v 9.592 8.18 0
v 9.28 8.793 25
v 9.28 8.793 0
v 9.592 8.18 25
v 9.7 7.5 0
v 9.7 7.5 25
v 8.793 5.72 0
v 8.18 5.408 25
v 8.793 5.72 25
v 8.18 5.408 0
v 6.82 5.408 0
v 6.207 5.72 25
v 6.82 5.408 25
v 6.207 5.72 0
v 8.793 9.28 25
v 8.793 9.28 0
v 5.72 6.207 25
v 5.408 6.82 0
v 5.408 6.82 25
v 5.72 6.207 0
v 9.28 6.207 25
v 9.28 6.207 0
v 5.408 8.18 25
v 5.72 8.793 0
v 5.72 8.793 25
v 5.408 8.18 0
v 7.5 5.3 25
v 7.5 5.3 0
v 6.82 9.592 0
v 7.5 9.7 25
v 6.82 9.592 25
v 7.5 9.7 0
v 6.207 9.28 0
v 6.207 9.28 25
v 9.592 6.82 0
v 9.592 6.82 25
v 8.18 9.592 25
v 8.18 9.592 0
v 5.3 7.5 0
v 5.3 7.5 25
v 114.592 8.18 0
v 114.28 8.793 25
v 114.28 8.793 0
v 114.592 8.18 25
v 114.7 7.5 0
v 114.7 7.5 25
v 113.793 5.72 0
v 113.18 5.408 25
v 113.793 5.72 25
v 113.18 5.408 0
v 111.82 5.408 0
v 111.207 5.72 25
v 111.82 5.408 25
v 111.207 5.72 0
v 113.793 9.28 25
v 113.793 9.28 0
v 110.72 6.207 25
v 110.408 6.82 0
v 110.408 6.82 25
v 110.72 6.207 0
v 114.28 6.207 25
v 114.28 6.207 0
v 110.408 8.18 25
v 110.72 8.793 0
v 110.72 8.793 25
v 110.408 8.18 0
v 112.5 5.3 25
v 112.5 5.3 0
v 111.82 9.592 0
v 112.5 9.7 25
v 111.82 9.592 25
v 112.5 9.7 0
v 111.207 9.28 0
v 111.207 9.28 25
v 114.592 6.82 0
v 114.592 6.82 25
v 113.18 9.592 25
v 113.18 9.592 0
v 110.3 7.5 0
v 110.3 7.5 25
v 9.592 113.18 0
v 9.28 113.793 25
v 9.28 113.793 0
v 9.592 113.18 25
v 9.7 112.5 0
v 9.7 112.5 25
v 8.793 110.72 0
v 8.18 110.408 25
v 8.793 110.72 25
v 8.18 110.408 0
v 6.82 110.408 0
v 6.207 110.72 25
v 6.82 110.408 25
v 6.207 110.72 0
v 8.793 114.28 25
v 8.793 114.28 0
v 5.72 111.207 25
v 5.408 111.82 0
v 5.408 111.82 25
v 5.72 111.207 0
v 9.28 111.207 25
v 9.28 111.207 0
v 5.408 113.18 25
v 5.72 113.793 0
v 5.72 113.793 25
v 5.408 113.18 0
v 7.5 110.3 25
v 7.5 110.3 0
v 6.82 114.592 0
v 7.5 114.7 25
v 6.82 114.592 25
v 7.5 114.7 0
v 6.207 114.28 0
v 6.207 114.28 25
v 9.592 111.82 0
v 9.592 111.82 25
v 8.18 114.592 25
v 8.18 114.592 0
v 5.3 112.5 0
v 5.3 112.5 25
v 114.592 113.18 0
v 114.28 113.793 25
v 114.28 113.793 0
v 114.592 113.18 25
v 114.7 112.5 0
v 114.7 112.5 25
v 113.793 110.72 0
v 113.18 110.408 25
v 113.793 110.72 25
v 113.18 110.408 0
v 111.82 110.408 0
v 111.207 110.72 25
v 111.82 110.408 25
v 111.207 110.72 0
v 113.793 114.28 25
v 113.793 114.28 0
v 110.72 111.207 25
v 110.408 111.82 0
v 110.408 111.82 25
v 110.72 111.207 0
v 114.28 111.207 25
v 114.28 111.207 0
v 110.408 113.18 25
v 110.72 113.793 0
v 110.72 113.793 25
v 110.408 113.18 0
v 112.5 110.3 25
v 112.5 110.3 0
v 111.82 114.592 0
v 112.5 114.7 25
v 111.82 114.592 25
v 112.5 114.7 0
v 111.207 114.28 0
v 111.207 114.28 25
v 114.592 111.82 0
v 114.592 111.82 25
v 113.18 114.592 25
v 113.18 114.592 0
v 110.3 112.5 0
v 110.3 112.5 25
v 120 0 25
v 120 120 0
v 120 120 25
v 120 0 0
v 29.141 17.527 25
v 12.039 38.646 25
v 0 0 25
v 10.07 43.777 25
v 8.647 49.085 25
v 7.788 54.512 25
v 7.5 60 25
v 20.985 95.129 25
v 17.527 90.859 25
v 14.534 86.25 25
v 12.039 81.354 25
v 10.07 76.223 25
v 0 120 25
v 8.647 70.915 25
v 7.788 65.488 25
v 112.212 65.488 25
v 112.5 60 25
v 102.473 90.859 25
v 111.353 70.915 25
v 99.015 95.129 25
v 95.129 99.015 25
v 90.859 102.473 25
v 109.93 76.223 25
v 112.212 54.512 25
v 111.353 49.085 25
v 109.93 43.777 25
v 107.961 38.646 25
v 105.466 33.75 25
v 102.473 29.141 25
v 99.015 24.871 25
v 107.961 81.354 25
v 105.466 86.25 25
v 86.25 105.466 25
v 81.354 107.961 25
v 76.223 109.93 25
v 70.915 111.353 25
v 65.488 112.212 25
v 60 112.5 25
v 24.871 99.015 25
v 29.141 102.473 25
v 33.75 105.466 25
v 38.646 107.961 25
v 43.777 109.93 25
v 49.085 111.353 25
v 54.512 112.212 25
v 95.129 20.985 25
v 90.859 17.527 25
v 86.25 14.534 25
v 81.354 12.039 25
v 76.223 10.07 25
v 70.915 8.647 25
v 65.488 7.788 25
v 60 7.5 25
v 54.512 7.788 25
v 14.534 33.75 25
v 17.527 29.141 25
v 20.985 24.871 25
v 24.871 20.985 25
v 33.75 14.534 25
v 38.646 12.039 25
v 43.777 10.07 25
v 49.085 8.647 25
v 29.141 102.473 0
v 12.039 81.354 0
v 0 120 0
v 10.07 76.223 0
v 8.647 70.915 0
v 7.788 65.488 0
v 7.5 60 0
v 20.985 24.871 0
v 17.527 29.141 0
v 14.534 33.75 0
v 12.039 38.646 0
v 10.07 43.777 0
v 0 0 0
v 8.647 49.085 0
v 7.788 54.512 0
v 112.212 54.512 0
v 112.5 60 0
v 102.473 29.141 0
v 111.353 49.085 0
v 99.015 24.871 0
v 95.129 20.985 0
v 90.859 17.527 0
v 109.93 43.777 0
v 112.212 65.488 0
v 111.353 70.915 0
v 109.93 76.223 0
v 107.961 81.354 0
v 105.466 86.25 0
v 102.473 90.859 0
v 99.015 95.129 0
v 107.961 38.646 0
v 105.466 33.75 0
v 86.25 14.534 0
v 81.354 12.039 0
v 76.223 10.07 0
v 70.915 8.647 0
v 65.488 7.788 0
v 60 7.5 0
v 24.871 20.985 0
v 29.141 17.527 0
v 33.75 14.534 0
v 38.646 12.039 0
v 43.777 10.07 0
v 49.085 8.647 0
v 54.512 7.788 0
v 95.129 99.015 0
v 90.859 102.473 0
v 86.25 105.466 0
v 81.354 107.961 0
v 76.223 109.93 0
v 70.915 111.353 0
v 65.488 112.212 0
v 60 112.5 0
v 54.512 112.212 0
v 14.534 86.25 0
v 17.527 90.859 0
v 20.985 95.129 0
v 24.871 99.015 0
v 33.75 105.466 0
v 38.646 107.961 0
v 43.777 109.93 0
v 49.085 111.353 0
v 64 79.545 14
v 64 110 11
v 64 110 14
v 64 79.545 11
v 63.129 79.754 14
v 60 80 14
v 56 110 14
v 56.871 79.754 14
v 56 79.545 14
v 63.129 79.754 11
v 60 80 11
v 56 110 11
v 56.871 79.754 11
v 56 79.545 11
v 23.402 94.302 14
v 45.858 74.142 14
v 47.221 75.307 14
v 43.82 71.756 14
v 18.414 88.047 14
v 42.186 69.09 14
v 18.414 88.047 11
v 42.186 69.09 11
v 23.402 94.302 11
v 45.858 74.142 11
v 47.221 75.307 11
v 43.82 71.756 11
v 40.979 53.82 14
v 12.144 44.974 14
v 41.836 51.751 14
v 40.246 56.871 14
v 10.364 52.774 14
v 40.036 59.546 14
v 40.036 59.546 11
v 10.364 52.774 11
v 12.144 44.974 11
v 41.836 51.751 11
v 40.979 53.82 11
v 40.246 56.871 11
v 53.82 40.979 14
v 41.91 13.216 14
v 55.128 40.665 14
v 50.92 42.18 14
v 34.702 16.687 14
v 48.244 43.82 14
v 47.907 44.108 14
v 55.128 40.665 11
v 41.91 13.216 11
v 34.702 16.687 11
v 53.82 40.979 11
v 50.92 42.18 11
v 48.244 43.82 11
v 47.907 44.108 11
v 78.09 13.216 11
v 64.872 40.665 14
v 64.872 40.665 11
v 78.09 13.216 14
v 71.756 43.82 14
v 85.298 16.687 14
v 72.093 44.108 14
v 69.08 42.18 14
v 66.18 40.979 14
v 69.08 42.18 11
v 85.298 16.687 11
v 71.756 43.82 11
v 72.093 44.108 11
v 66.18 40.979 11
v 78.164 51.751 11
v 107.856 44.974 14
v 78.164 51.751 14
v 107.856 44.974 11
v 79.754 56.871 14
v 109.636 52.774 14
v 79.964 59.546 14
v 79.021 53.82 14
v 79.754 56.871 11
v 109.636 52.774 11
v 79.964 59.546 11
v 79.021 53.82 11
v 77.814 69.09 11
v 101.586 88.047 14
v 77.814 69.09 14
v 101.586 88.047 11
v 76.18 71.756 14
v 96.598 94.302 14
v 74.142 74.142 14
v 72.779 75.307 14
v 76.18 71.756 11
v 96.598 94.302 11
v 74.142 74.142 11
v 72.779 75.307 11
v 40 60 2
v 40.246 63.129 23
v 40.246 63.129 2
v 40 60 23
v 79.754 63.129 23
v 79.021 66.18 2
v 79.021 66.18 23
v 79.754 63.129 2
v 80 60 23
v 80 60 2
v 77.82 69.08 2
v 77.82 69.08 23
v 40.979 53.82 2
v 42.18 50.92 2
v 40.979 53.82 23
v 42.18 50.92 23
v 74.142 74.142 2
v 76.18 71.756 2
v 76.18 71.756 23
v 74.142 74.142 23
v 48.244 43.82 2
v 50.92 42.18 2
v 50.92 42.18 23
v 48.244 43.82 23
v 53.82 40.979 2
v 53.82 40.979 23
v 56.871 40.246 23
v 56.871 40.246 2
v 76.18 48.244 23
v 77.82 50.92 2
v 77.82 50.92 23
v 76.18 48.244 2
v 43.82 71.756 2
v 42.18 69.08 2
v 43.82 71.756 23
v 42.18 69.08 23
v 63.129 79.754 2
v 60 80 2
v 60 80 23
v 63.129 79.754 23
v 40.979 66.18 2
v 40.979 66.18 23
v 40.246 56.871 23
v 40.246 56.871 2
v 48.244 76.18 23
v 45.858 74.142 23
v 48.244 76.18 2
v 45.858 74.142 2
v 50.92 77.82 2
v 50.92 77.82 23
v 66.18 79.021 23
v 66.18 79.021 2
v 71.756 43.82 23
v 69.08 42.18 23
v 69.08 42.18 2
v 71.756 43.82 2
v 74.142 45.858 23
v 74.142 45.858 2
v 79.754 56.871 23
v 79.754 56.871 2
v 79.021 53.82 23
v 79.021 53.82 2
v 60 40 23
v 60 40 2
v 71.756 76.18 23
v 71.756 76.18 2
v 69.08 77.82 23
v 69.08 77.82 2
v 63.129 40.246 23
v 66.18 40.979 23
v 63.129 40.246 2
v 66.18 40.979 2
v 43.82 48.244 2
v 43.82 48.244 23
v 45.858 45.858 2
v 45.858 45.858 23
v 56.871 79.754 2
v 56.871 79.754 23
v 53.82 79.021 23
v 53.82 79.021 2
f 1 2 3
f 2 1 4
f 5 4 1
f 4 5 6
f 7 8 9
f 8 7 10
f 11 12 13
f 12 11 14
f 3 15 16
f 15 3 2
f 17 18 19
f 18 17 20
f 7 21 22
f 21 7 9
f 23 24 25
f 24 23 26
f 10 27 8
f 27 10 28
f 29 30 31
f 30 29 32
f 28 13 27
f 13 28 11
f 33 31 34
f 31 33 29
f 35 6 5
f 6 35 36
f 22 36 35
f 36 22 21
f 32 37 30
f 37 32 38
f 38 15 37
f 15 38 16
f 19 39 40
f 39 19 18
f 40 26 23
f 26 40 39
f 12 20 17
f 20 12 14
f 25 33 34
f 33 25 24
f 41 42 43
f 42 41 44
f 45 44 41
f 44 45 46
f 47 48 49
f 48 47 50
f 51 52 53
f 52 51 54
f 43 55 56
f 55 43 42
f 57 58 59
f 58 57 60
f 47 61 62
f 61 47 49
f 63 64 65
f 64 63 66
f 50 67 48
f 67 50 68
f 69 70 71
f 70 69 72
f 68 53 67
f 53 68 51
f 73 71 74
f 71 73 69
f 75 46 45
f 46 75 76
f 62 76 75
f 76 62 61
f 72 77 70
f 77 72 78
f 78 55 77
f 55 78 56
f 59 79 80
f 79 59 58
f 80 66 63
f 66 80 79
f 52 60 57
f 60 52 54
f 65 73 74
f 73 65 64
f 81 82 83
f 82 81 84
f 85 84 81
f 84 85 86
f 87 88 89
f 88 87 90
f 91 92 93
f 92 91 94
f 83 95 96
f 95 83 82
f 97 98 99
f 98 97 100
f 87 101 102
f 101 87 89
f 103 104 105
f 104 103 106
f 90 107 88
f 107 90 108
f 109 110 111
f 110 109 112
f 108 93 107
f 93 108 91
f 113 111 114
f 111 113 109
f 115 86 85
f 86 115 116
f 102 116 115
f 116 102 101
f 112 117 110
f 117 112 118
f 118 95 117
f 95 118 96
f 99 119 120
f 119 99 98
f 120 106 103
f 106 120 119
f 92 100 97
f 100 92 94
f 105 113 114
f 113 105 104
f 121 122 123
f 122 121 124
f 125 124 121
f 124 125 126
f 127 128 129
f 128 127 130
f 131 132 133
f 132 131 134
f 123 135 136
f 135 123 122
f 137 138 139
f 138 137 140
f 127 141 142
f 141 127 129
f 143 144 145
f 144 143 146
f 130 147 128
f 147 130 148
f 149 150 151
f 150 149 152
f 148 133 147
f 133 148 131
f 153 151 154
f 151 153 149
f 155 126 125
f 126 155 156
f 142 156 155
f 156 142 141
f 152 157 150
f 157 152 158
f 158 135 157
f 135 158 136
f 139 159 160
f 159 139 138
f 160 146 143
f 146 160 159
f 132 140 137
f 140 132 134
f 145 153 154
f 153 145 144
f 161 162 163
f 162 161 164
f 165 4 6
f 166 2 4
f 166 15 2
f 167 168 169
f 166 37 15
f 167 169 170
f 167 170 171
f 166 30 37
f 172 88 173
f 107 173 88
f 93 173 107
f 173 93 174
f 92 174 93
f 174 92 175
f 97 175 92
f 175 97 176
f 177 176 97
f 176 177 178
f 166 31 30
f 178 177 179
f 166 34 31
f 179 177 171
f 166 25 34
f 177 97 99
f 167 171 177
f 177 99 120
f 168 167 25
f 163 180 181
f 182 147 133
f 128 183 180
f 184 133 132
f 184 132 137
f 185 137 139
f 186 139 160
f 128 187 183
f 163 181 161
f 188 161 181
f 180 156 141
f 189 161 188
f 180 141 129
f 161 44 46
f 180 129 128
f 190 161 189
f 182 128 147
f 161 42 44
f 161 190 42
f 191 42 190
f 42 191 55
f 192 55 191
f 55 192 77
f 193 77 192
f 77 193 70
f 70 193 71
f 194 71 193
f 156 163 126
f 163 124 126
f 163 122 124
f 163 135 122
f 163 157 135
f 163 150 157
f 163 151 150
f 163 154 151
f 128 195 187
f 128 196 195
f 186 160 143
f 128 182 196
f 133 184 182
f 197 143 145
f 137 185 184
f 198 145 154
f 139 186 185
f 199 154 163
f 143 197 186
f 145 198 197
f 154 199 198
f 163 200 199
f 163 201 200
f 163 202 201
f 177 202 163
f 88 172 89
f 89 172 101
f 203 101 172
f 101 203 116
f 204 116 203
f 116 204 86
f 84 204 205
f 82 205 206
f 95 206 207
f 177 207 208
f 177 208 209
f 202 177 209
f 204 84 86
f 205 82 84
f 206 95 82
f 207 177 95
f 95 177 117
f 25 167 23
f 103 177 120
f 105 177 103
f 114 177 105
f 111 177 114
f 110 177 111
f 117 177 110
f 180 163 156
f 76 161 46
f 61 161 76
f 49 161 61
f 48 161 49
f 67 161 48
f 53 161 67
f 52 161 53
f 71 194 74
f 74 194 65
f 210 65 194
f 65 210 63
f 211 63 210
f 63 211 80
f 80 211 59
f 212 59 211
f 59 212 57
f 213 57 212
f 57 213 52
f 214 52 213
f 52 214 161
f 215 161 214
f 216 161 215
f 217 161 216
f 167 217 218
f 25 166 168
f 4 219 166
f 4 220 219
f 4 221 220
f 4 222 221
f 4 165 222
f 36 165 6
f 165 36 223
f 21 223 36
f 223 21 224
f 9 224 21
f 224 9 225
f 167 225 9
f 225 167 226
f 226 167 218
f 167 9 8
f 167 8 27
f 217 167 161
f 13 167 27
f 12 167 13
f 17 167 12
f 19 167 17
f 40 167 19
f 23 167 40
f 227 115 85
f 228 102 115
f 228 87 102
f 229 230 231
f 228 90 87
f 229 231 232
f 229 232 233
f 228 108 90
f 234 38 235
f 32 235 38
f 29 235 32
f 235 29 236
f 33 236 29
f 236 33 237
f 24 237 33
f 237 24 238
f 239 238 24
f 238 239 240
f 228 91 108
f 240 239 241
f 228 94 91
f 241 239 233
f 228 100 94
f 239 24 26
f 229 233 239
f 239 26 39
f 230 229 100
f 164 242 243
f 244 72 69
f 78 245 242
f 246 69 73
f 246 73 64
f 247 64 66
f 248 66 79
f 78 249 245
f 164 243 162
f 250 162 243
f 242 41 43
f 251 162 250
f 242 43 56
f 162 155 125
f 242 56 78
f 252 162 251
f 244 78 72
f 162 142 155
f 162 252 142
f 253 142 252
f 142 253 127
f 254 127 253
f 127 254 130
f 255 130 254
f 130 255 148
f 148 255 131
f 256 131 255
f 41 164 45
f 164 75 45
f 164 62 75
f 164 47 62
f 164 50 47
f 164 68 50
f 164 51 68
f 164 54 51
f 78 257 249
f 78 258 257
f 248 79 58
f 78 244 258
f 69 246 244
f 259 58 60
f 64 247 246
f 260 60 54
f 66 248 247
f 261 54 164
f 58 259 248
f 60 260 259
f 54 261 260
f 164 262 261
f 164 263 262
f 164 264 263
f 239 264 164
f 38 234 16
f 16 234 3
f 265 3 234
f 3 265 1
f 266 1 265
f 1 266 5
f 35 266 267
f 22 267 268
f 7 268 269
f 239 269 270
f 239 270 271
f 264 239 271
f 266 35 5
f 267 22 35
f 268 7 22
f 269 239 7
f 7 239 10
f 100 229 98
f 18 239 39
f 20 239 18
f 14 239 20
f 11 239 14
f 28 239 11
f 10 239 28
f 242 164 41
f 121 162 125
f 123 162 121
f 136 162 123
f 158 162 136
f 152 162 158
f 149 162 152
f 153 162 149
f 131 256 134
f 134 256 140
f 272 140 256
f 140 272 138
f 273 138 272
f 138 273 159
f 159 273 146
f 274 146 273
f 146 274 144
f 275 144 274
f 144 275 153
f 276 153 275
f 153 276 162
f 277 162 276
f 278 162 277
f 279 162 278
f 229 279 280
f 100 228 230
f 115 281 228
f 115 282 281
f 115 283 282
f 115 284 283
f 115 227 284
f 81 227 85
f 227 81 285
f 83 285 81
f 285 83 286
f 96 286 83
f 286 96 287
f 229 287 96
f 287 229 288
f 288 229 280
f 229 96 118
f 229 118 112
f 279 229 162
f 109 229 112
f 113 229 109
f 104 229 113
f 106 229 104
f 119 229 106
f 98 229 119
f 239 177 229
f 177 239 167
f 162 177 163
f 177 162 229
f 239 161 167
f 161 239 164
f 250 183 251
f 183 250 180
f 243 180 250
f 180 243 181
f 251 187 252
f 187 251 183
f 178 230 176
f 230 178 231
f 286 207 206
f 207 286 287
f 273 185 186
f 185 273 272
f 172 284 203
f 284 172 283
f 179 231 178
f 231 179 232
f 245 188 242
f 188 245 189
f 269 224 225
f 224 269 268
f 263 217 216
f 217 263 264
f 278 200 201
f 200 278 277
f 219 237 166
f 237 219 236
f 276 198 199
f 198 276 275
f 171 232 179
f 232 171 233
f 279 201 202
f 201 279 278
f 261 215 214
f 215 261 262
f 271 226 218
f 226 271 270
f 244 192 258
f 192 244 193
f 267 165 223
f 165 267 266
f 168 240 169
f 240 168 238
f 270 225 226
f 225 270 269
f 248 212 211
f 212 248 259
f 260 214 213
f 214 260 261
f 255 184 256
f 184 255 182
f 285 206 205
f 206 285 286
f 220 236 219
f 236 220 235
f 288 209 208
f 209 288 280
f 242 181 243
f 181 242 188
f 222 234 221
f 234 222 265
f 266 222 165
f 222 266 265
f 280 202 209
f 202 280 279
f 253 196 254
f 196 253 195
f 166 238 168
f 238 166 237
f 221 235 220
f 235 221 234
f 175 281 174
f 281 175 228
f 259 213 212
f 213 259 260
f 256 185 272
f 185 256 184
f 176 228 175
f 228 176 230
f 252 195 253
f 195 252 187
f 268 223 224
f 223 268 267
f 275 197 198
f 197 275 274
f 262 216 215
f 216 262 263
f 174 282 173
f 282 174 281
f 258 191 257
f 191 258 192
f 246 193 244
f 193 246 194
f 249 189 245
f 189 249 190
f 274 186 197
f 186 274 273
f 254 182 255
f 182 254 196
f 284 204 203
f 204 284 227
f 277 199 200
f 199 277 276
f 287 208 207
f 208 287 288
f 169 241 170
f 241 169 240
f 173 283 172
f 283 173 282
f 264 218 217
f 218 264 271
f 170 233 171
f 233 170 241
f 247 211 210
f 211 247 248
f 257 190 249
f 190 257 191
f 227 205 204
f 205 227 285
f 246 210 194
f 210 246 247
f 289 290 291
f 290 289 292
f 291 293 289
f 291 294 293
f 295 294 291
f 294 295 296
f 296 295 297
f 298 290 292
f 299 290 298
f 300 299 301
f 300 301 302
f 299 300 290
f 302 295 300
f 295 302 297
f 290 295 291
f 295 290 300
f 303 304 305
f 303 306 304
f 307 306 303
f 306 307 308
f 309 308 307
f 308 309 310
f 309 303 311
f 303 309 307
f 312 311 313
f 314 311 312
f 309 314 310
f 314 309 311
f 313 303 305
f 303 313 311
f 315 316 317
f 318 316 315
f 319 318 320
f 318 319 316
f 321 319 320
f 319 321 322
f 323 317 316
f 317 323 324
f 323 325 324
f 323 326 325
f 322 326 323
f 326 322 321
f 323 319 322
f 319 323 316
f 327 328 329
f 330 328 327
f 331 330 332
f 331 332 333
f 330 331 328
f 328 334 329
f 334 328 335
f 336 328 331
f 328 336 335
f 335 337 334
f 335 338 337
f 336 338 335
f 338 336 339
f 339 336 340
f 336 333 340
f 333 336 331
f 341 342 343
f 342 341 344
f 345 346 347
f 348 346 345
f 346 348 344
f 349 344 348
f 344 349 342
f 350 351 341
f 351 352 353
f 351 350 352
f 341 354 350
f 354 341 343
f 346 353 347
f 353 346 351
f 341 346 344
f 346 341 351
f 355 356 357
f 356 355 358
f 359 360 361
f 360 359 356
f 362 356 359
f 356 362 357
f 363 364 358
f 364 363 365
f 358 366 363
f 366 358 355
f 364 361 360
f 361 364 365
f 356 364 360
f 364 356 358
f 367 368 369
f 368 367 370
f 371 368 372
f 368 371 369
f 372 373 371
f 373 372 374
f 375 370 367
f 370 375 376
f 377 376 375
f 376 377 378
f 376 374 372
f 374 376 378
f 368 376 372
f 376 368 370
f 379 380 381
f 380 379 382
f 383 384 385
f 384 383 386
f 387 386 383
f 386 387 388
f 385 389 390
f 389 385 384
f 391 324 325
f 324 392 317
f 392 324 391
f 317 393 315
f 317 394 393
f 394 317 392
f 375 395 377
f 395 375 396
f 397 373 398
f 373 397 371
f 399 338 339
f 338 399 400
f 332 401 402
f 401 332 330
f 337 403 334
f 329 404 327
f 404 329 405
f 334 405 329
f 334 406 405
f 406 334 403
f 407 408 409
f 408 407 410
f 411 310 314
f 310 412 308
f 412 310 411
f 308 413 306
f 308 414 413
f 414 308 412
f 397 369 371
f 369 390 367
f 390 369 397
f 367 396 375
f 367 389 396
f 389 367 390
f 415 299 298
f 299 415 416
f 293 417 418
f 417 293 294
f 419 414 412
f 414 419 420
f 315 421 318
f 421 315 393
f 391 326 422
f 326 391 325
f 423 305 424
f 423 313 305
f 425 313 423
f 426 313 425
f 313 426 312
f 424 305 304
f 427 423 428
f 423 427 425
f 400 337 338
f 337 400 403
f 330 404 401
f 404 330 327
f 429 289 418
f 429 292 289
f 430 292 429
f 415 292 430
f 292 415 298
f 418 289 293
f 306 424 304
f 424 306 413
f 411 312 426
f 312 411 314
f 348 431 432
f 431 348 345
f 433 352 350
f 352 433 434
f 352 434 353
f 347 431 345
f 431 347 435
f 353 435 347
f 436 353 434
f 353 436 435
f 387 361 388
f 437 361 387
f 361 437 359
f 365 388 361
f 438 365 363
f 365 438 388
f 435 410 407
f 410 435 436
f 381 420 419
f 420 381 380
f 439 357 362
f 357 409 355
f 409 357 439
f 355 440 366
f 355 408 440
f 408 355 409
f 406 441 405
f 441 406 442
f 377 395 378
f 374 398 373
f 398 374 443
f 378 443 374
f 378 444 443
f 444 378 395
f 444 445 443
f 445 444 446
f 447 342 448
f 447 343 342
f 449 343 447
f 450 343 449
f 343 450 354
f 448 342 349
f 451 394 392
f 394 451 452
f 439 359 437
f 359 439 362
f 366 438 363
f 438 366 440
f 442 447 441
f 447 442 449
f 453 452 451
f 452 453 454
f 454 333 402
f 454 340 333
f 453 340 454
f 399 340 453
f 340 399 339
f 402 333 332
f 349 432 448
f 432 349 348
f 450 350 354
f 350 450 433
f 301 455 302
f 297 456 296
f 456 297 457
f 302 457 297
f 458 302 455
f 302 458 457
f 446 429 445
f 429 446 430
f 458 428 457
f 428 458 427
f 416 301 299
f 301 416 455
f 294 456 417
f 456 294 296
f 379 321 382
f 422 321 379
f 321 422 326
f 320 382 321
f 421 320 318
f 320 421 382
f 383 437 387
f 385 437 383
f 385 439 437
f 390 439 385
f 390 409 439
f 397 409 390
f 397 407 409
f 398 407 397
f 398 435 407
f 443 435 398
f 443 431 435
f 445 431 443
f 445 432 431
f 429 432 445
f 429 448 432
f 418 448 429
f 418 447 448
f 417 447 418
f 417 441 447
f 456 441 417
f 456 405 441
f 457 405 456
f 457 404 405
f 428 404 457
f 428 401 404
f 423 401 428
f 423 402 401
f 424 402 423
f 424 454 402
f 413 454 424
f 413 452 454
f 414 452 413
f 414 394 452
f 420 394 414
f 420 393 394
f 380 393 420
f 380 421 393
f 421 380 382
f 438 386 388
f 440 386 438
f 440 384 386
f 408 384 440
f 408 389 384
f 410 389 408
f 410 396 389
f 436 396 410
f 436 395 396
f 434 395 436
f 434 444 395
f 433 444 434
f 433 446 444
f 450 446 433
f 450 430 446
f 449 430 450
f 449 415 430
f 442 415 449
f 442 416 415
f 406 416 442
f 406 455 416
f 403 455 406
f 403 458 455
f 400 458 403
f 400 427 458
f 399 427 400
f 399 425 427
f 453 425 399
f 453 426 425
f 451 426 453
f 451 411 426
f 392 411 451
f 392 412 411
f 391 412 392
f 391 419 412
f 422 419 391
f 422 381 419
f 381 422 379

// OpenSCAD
// 120mm Case Fan Model
// Standard 120x120x25mm fan

module fan_120() {
    fan_size = 120;
    fan_thickness = 25;
    hub_diameter = 40;
    corner_radius = 5;
    mount_hole_inset = 7.5;  // Distance from edge to mount hole center
    mount_hole_radius = 2.2; // ~M4 clearance

    union() {
        color("dimgray") {
            difference() {
                // Outer frame (rounded corners approximated)
                cube([fan_size, fan_size, fan_thickness]);

                // Center opening for airflow
                translate([fan_size/2, fan_size/2, -0.1]) {
                    cylinder(h = fan_thickness + 0.2, r = (fan_size - 15) / 2, $fn = 60);
                }

                // Corner mount holes
                mount_positions = [
                    [mount_hole_inset, mount_hole_inset],
                    [fan_size - mount_hole_inset, mount_hole_inset],
                    [mount_hole_inset, fan_size - mount_hole_inset],
                    [fan_size - mount_hole_inset, fan_size - mount_hole_inset]
                ];
                for (pos = mount_positions) {
                    translate([pos[0], pos[1], -0.1]) {
                        cylinder(h = fan_thickness + 0.2, r = mount_hole_radius, $fn = 20);
                    }
                }
            }
        }

        // Hub
        color("black") {
            translate([fan_size/2, fan_size/2, fan_thickness/2]) {
                cylinder(h = fan_thickness - 4, r = hub_diameter/2, center = true, $fn = 40);
            }
        }

        // Blades (simplified)
        color("gray") {
            translate([fan_size/2, fan_size/2, fan_thickness/2]) {
                for (i = [0:6]) {
                    rotate([0, 0, i * 360/7]) {
                        translate([0, 30, 0]) {
                            cube([8, 40, 3], center = true);
                        }
                    }
                }
            }
        }
    }
}

// Preview
fan_120();
